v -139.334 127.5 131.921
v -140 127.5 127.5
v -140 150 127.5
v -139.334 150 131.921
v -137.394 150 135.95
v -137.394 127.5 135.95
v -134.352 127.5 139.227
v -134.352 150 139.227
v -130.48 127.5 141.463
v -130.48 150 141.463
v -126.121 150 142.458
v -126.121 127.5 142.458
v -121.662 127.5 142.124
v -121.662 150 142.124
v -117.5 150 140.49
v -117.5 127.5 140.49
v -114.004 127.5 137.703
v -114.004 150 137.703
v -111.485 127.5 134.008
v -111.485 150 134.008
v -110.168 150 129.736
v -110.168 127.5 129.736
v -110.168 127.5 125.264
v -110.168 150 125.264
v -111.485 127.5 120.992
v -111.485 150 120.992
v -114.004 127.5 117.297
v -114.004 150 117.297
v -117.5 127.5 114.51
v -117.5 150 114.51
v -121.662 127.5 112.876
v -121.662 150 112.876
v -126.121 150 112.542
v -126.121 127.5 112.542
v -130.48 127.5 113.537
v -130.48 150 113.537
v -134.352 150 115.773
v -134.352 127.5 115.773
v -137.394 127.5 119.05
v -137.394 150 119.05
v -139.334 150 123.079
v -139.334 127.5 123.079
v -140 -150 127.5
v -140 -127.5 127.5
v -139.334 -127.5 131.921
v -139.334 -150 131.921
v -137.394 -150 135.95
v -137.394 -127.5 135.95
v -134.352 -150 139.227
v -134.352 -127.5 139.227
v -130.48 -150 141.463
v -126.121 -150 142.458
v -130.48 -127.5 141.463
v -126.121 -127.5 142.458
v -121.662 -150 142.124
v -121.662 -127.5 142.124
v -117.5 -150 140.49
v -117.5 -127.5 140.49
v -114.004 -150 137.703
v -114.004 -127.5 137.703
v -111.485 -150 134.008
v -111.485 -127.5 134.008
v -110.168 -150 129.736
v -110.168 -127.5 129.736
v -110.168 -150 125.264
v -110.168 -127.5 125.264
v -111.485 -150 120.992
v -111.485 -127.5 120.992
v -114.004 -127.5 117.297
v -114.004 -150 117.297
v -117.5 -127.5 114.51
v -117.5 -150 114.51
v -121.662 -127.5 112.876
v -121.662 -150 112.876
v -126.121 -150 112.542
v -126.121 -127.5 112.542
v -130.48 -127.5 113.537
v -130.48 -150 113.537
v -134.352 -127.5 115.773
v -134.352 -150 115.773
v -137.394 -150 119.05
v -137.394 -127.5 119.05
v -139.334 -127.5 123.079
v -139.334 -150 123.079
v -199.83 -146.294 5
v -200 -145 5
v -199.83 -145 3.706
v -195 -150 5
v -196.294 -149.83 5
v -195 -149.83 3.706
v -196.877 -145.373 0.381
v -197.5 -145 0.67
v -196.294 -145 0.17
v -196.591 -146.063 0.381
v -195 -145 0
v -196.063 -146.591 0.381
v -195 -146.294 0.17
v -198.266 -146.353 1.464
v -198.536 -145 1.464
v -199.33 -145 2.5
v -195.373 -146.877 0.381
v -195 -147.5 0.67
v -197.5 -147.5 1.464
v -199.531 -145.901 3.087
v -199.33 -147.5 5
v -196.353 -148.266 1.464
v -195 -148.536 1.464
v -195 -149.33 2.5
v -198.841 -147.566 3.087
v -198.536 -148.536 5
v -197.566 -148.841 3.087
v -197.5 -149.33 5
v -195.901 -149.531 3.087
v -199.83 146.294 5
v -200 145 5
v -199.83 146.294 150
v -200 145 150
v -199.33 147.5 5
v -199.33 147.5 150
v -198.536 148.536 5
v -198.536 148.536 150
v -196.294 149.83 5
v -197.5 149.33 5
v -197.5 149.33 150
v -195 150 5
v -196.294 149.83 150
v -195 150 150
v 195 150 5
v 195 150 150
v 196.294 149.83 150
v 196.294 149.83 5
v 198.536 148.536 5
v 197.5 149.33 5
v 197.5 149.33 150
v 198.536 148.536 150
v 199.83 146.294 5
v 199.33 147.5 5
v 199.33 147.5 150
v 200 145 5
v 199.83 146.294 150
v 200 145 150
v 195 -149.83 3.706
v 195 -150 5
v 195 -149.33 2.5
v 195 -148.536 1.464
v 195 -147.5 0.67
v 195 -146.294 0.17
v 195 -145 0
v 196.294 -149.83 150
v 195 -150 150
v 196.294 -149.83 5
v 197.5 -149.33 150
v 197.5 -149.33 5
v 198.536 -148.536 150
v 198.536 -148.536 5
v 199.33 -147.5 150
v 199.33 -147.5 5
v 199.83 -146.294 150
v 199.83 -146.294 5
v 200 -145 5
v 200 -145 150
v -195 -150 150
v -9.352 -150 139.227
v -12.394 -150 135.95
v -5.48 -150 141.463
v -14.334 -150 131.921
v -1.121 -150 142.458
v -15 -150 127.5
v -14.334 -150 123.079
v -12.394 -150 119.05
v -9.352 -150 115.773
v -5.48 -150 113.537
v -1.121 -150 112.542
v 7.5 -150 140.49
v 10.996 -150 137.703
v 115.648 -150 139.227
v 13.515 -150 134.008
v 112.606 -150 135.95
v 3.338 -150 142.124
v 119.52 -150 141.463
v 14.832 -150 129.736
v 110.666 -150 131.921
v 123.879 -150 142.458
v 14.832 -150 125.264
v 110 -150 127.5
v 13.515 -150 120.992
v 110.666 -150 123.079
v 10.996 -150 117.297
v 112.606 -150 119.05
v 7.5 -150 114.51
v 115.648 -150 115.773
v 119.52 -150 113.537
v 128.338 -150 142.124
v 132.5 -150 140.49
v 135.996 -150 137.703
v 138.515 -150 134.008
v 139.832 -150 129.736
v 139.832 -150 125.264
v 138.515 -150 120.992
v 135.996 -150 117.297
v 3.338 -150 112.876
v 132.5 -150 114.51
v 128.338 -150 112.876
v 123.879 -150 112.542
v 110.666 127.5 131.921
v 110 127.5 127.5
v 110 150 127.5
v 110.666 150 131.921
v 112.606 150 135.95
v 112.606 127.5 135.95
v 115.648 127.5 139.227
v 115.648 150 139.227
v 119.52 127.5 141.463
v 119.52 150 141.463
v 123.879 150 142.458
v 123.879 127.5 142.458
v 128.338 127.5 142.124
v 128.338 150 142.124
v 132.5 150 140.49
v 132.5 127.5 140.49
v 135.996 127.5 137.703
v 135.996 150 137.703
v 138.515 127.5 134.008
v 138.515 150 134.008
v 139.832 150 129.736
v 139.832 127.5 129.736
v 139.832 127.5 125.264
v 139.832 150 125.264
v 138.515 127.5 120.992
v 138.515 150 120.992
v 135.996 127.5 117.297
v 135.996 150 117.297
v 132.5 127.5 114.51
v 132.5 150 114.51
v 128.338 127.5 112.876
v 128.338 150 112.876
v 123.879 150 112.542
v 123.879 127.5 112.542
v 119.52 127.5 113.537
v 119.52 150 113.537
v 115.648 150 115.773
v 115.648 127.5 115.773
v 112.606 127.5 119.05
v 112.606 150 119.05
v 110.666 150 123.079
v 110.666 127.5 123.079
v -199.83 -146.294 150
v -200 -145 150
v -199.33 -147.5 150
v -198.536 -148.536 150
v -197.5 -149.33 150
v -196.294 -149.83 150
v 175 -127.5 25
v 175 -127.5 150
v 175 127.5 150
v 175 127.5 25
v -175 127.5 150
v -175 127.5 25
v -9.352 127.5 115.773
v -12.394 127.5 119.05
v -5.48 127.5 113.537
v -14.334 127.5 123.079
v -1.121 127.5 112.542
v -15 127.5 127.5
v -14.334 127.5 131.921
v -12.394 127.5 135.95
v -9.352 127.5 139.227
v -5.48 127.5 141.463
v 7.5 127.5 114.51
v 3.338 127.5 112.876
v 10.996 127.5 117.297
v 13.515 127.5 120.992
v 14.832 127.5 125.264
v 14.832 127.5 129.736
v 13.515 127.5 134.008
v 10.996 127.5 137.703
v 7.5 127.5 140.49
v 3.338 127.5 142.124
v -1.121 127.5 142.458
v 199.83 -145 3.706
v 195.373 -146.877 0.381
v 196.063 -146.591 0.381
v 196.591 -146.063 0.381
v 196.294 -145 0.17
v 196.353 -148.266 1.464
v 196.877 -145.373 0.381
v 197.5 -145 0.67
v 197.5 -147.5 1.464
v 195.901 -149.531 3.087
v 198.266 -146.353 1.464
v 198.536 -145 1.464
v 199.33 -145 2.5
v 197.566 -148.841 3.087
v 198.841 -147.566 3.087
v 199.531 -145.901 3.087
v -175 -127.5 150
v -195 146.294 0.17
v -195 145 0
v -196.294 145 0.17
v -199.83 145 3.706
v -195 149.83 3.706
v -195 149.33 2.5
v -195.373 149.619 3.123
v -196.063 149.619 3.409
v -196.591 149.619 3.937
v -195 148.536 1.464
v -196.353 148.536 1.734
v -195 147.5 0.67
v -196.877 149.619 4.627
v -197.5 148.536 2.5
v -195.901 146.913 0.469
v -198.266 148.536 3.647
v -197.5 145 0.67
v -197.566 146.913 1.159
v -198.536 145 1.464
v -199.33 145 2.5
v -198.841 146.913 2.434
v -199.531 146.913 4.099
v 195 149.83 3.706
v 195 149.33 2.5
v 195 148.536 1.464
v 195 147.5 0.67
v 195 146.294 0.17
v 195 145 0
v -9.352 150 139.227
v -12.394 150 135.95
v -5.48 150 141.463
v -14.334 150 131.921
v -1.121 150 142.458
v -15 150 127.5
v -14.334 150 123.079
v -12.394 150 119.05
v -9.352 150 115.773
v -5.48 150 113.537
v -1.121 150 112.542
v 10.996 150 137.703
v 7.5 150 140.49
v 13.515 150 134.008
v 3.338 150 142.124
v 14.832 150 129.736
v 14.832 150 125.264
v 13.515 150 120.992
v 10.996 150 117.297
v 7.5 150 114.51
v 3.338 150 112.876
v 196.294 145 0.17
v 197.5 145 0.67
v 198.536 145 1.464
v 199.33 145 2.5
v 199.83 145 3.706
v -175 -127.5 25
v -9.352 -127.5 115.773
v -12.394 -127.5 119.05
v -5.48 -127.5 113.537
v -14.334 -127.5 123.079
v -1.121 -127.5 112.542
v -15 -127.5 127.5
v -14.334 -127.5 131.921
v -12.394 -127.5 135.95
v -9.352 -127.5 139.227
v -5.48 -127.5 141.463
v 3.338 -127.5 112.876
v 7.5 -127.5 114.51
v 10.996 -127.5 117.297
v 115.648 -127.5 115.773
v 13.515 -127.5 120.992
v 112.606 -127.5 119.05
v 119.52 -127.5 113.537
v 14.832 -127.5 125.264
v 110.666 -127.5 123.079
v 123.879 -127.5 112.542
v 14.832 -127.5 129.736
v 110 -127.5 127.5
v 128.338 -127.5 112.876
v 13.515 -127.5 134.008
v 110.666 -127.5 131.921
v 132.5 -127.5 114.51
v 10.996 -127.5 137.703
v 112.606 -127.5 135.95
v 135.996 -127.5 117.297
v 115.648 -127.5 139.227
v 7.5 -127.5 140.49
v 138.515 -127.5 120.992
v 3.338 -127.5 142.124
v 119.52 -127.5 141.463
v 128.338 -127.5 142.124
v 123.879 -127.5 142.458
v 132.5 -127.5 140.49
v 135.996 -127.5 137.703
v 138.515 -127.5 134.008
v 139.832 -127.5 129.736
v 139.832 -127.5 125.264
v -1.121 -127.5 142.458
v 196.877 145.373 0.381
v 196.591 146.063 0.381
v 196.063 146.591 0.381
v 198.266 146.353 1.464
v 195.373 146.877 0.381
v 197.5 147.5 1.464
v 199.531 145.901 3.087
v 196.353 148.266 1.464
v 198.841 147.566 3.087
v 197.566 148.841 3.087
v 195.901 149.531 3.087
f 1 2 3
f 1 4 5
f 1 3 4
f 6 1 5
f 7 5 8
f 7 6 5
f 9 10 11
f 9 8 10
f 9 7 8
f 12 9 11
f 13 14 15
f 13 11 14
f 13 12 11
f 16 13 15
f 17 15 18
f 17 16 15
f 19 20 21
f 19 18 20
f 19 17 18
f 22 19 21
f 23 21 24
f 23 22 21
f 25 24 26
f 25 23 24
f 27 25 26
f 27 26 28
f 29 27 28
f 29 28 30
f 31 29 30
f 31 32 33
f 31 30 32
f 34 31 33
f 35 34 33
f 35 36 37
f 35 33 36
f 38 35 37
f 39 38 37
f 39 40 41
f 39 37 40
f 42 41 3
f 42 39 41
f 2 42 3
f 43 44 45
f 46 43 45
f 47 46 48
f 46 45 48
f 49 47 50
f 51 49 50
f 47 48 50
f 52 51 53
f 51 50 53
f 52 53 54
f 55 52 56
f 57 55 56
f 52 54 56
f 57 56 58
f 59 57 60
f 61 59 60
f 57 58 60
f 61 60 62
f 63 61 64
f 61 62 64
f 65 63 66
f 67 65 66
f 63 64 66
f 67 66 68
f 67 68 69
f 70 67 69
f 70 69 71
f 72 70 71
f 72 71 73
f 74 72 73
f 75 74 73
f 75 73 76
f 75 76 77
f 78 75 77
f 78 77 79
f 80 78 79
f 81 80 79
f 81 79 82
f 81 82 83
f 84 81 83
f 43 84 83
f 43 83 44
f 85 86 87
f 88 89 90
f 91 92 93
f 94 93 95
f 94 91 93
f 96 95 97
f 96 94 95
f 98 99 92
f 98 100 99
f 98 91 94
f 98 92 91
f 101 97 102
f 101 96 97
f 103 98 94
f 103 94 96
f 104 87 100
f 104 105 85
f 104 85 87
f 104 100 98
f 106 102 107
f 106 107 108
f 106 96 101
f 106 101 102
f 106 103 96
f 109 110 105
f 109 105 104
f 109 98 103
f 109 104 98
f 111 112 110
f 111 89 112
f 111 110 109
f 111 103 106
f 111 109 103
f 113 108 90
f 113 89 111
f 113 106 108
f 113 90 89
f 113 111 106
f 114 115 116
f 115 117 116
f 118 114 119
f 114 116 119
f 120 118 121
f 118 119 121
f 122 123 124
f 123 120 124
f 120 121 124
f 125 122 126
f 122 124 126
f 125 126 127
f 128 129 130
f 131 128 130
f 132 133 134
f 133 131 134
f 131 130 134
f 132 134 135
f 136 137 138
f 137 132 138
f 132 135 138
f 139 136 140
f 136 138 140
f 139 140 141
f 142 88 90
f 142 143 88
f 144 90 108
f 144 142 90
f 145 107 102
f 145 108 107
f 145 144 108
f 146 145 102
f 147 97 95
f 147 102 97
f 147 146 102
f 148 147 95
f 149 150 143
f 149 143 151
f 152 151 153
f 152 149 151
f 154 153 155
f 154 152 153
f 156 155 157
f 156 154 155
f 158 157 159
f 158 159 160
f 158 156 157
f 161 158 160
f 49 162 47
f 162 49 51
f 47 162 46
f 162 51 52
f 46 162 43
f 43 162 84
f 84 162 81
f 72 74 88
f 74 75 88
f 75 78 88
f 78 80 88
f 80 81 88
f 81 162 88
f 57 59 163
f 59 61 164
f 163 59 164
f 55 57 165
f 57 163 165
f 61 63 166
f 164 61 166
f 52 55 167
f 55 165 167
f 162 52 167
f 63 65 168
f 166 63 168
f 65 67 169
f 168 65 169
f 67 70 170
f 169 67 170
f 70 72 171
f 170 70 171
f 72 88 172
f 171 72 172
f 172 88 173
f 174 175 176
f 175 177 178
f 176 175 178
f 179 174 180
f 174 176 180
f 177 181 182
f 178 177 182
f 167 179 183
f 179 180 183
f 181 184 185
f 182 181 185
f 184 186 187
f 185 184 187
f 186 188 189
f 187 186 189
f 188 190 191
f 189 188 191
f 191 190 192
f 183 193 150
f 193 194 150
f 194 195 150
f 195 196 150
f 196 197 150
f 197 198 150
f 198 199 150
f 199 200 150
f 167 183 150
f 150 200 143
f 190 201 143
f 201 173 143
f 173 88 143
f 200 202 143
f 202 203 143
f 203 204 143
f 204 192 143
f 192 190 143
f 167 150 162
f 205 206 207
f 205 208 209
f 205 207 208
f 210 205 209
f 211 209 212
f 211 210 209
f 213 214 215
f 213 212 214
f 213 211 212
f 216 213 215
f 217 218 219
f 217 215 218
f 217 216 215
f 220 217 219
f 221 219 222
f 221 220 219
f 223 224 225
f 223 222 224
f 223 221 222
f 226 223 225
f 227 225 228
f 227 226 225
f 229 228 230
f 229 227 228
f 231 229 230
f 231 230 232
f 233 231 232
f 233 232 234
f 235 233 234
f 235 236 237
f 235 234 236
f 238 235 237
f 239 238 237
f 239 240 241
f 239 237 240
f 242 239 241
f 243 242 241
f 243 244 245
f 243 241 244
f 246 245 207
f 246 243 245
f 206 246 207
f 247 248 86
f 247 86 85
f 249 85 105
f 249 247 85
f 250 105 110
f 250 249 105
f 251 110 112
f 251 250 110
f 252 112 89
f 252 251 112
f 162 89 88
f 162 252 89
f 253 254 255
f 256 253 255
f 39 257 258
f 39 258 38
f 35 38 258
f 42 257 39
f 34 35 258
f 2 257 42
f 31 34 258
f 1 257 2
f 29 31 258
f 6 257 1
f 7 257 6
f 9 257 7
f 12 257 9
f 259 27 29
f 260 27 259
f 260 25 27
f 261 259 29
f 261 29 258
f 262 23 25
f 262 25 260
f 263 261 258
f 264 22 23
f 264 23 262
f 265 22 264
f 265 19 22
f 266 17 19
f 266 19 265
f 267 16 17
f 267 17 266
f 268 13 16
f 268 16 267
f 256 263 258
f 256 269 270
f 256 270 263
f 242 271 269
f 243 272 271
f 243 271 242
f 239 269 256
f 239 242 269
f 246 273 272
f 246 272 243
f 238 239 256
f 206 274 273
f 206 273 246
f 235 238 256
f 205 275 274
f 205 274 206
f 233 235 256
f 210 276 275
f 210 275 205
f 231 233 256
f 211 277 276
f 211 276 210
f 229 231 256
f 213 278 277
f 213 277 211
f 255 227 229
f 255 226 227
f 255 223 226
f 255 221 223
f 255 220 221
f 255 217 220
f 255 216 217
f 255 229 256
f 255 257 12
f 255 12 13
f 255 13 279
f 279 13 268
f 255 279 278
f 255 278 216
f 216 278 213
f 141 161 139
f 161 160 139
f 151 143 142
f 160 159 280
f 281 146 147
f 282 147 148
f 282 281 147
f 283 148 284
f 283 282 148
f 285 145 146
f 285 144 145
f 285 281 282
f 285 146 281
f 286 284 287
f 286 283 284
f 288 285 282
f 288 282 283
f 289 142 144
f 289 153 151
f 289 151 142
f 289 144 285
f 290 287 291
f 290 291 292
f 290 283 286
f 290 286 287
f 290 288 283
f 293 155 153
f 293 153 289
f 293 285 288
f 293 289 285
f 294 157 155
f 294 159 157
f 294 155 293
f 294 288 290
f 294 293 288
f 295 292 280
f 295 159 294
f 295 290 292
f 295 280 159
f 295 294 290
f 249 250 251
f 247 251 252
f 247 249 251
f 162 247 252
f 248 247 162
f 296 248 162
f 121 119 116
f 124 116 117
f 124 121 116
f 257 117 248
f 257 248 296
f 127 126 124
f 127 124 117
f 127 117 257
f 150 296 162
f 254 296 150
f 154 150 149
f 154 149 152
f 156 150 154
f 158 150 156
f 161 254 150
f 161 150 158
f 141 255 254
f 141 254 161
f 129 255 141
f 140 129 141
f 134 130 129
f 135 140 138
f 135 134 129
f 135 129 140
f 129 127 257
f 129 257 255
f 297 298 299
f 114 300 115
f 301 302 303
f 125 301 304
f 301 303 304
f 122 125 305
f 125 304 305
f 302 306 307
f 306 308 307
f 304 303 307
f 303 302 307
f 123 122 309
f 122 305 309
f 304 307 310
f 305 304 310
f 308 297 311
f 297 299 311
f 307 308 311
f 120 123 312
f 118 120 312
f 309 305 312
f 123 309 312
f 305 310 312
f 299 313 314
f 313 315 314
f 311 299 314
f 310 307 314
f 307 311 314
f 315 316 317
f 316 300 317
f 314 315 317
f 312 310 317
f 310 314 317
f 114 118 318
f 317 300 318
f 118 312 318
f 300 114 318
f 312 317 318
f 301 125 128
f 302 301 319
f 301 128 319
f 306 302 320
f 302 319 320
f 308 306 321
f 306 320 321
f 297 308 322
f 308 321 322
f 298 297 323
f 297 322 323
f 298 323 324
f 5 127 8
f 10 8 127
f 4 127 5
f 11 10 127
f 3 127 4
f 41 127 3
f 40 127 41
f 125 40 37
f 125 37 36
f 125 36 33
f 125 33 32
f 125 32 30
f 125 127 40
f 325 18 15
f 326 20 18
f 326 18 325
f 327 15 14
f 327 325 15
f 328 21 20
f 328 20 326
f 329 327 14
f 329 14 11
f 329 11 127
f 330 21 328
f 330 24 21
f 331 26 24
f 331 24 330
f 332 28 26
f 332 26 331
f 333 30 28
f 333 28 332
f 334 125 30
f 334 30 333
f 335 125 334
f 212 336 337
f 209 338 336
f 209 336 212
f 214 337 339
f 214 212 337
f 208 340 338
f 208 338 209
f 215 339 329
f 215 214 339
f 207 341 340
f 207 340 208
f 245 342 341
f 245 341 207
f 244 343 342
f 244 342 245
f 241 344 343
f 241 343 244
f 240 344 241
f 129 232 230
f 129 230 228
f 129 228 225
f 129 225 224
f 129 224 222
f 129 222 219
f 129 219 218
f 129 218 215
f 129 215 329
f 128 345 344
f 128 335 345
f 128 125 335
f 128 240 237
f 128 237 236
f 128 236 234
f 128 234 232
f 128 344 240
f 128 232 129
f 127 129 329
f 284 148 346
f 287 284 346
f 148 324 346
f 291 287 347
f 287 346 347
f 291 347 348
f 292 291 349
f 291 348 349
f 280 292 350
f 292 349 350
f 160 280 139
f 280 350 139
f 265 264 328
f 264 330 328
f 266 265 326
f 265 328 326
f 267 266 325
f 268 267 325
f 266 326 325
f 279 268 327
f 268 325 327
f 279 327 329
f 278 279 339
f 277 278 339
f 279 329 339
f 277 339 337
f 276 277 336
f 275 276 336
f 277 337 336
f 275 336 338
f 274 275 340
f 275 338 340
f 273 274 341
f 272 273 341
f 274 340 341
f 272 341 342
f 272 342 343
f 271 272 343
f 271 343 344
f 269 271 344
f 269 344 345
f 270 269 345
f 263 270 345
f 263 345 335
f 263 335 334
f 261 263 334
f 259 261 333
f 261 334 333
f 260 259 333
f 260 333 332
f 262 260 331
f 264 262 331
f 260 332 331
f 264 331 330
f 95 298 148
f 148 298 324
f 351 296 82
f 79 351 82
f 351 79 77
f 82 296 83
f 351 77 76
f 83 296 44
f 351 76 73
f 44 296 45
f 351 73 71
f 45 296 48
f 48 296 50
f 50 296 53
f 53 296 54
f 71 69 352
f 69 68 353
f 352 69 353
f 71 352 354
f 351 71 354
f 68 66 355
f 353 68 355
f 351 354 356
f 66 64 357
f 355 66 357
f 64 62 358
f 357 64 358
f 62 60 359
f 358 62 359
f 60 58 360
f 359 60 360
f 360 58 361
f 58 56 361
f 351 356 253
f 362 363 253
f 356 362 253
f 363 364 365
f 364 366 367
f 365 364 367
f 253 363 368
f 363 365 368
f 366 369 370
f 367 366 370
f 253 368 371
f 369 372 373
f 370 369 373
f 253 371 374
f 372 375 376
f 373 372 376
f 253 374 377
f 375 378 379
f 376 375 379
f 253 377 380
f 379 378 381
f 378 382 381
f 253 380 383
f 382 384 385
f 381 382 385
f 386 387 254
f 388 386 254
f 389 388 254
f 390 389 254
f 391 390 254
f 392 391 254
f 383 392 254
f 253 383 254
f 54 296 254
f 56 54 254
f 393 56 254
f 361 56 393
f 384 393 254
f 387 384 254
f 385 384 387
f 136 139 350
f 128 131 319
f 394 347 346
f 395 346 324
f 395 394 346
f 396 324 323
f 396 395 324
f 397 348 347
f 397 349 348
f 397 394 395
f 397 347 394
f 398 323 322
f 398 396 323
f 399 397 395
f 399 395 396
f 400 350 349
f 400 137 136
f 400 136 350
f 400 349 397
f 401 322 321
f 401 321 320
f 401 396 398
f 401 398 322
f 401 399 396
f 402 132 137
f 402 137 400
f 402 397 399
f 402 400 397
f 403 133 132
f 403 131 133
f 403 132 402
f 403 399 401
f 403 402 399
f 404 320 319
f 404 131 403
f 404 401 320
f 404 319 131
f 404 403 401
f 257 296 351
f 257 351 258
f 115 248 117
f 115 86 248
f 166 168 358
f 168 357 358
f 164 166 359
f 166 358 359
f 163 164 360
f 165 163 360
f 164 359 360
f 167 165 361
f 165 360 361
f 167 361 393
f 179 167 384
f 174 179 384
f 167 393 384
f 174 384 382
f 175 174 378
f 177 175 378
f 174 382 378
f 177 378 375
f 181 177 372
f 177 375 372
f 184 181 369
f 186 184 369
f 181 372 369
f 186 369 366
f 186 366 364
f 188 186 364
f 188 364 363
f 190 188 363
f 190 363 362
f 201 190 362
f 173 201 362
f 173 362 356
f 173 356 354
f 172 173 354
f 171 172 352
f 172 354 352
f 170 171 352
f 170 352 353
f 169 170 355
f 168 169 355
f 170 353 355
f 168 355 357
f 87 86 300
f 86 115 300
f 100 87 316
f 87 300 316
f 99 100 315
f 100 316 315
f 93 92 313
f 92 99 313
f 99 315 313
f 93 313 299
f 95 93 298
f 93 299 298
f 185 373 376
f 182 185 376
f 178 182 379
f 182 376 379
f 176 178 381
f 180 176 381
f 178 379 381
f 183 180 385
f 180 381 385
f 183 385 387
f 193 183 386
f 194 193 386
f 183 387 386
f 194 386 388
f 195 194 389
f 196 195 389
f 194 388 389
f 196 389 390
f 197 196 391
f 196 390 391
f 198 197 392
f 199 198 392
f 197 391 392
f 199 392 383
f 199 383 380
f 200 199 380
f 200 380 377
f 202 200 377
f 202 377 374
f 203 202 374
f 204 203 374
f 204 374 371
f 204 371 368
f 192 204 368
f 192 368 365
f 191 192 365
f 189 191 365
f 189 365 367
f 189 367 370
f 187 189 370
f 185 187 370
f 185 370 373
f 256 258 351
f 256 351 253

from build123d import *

# Parameters (mm, degrees)
F0_W     = 400
F0_H     = 300
F1_DEPTH = 150
F2_W     = 350
F2_H     = 255
F3_DEPTH = 125
F4_R     = 5
F5_R     = 15
F6_DEPTH = 402


with BuildPart() as f1:
    # F0 (on Top) → F1 (new body)
    with BuildSketch(Plane.XY):
        Rectangle(F0_W, F0_H)
    extrude(amount=F1_DEPTH)

    # F2 (on face) → F3 (cut)
    with BuildSketch(Plane.XY.offset(150)):
        Rectangle(F2_W, F2_H)
    extrude(amount=-F3_DEPTH, mode=Mode.SUBTRACT)

    # F4
    f4_edges = [f1.edges().sort_by_distance(p)[0] for p in [
        (200, 150, 75),
        (200, -150, 75),
        (-200, -150, 75),
        (-200, 0, 0),
        (0, -150, 0),
        (200, 0, 0),
        (0, 150, 0),
        (-200, 150, 75),
    ]]
    fillet(f4_edges, radius=F4_R)

    # F5 (on face) → F6 (cut, symmetric)
    with BuildSketch(Plane(origin=(0, -127.5, 0), x_dir=(-1, 0, 0), z_dir=(0, 1, 0))):
        with Locations((125, 127.5)):
            Circle(F5_R)
        with Locations((-125, 127.5)):
            Circle(F5_R)
        with Locations((0, 127.5)):
            Circle(F5_R)
    extrude(amount=F6_DEPTH, both=True, mode=Mode.SUBTRACT)


solid = f1.part
